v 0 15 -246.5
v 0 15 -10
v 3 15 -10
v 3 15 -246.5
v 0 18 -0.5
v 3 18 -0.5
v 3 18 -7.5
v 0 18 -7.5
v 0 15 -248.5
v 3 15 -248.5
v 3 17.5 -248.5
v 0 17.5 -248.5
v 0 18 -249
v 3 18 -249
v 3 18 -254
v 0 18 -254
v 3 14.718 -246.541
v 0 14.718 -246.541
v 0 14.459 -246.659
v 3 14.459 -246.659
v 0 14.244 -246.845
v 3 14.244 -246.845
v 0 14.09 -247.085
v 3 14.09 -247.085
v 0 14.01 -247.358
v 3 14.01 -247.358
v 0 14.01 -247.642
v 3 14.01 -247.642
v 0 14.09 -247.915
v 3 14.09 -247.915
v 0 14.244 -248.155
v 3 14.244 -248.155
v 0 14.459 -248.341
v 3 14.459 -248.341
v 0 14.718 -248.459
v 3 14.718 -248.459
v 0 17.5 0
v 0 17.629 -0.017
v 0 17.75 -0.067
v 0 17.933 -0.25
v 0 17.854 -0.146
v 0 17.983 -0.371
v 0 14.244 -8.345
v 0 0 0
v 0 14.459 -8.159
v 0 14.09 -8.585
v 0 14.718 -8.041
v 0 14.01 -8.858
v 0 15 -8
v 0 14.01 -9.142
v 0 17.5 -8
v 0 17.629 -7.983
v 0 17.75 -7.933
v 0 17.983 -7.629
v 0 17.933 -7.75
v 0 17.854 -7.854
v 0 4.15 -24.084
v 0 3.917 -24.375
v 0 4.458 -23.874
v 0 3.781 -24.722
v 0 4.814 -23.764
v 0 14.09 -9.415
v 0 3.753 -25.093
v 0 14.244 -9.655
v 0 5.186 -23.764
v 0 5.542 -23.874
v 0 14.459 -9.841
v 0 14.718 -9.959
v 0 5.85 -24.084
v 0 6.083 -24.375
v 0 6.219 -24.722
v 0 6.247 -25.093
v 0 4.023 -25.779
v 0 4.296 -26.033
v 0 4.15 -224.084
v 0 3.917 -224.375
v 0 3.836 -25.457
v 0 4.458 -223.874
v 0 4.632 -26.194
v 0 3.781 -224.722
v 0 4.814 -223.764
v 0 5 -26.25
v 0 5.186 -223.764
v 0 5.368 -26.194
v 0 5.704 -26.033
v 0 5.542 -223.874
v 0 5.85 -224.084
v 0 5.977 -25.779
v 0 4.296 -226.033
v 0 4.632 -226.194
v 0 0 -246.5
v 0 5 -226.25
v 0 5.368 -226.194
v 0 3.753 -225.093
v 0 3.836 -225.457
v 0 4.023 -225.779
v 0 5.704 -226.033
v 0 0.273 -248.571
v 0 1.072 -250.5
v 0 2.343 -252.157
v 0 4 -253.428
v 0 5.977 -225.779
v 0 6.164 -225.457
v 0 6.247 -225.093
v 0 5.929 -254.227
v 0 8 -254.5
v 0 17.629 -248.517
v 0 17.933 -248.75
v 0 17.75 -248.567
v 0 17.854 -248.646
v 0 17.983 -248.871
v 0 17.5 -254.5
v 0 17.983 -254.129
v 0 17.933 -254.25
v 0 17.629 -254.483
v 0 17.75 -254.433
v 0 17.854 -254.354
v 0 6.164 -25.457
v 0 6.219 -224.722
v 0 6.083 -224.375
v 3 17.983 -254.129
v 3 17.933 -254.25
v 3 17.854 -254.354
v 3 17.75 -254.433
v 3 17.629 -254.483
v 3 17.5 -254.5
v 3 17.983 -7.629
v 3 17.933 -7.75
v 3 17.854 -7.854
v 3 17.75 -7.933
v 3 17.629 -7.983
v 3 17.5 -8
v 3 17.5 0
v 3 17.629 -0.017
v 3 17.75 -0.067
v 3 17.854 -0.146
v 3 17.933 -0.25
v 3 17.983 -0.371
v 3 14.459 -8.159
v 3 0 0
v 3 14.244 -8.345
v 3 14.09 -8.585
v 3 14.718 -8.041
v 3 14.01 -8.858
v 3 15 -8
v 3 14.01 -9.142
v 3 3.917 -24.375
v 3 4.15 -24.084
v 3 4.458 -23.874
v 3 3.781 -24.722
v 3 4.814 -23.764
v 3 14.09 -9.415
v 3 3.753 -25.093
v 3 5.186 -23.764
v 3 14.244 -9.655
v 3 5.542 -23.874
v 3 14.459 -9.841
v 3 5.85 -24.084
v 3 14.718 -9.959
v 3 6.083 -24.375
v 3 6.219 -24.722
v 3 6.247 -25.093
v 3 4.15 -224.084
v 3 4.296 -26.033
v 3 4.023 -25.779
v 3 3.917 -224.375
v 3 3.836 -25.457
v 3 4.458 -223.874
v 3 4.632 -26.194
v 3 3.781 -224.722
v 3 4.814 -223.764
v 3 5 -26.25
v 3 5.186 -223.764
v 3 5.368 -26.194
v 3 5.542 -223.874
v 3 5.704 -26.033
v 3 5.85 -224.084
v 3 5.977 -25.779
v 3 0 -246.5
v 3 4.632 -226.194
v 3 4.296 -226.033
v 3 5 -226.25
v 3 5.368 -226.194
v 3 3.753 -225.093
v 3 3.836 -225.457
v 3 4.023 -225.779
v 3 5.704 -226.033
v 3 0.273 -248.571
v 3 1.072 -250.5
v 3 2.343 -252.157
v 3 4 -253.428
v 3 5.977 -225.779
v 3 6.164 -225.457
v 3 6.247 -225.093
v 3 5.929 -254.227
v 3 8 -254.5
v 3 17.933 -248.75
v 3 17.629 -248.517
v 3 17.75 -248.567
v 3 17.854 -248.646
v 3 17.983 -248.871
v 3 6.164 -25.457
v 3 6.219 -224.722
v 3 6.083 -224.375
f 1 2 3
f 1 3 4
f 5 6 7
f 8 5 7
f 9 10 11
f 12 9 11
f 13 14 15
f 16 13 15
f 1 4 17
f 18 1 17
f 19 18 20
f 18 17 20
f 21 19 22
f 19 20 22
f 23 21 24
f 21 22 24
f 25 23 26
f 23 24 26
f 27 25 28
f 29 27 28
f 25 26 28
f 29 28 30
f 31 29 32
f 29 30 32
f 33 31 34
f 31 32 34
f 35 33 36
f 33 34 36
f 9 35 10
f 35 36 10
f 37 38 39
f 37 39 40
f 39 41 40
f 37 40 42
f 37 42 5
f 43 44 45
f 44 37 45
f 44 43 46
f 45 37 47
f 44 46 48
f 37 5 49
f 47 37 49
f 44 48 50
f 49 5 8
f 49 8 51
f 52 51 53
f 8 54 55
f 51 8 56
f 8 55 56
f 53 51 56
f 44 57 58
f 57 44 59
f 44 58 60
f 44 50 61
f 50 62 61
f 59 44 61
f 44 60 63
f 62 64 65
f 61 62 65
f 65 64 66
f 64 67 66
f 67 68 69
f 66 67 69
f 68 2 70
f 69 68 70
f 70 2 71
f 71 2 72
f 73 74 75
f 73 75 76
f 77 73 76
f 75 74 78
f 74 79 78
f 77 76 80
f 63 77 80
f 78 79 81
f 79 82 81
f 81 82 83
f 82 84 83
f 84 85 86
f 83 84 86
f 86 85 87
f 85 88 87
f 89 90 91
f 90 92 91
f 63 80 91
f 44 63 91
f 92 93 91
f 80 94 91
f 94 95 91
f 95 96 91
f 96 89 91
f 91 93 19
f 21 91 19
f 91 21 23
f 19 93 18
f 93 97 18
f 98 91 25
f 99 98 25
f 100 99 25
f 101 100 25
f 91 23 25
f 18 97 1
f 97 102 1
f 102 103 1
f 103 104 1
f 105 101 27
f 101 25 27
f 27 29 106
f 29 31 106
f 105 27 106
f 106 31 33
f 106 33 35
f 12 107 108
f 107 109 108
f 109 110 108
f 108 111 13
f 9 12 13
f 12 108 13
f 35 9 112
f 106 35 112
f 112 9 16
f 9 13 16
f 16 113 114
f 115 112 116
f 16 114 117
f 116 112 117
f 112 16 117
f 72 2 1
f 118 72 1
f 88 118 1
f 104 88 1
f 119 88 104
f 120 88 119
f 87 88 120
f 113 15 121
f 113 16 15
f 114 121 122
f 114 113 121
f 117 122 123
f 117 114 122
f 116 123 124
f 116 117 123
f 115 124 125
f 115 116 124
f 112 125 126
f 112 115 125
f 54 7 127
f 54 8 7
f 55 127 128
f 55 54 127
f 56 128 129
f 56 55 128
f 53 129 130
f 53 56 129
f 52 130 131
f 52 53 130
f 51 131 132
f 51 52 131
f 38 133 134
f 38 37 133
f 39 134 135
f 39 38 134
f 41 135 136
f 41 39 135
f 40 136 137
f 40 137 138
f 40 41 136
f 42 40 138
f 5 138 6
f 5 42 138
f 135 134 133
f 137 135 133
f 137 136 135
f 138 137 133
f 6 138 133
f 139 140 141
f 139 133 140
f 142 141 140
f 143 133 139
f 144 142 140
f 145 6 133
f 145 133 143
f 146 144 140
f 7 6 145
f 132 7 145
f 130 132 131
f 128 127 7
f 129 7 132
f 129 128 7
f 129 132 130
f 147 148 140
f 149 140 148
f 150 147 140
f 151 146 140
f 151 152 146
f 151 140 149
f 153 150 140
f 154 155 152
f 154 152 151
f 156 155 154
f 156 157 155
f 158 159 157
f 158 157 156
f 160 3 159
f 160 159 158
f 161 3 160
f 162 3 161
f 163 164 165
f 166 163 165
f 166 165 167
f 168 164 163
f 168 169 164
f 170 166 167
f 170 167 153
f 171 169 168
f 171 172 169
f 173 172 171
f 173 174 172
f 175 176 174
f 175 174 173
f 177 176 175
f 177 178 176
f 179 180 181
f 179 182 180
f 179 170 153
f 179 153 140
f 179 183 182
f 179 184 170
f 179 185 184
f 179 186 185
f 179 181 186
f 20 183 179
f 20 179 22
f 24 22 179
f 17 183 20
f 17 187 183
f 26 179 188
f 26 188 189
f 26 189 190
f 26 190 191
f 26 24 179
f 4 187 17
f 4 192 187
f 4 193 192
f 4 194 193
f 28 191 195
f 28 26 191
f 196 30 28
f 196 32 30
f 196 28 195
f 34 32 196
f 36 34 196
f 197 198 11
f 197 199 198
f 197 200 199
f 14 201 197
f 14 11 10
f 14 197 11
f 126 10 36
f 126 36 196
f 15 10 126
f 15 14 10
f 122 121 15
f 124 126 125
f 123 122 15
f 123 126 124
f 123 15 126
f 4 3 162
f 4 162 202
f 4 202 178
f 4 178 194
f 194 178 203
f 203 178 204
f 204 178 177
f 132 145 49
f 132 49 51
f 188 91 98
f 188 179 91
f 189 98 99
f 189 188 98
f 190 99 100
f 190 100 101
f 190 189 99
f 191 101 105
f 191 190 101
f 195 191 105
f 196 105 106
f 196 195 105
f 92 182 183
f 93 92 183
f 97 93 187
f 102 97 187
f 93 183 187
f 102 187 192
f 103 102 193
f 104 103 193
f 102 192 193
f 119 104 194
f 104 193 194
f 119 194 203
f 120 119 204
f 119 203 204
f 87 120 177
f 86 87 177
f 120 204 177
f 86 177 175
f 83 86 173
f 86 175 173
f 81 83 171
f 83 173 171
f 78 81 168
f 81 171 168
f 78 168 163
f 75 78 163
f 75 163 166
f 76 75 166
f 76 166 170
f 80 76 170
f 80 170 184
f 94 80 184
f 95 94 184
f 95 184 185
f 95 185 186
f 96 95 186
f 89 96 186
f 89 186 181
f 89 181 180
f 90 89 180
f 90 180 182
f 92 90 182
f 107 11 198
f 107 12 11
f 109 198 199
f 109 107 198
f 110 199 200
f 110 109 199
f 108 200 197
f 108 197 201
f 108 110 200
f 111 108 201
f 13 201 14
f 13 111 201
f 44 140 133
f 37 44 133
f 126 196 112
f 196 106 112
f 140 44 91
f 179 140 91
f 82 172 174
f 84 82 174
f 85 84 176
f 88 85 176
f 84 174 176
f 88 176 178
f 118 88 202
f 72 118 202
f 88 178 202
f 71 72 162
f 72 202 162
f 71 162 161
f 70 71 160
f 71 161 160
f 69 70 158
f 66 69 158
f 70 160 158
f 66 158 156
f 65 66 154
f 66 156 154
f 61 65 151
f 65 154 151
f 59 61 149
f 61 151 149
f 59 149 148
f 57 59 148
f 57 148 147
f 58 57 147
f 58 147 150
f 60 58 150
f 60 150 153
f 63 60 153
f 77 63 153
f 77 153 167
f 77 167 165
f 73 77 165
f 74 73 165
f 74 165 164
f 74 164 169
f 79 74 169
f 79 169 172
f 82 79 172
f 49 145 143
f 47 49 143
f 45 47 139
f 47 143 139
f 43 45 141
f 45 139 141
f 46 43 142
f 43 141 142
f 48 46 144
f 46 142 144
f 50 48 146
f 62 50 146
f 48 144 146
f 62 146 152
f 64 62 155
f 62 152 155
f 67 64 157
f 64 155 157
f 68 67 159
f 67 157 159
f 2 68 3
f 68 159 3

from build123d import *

# Parameters (mm, degrees)
SKETCH_1_W          = 254.5
SKETCH_1_H          = 15
EXTRUDE_1_DEPTH     = 3
SKETCH_2_W          = 8
SKETCH_2_H          = 3
SKETCH_2_W_2        = 6
EXTRUDE_2_DEPTH     = 3
SKETCH_3_R          = 1
CUT_EXTRUDE_1_DEPTH = 3
FILLET_1_R          = 0.5
SKETCH_4_R          = 1.25
CUT_EXTRUDE_2_DEPTH = 10
FILLET_2_R          = 8


with BuildPart() as part:
    # 스케치1 → 보스-돌출1 (new body)
    with BuildSketch(Plane(origin=(0, 0, 0), x_dir=(0, 0, -1), z_dir=(1, 0, 0))):
        with Locations((127.25, 7.5)):
            Rectangle(SKETCH_1_W, SKETCH_1_H)
    extrude(amount=EXTRUDE_1_DEPTH)

    # 스케치2 → 보스-돌출2 (add)
    with BuildSketch(Plane(origin=(3, 0, 0), x_dir=(0, 0, -1), z_dir=(1, 0, 0))):
        with Locations((4, 16.5)):
            Rectangle(SKETCH_2_W, SKETCH_2_H)
        with Locations((251.5, 16.5)):
            Rectangle(SKETCH_2_W_2, SKETCH_2_H)
    extrude(amount=-EXTRUDE_2_DEPTH)

    # 스케치3 → 컷-돌출1 (cut)
    with BuildSketch(Plane(origin=(3, 0, 0), x_dir=(0, 0, -1), z_dir=(1, 0, 0))):
        with Locations((9, 15)):
            Circle(SKETCH_3_R)
        with Locations((247.5, 15)):
            Circle(SKETCH_3_R)
    extrude(amount=-CUT_EXTRUDE_1_DEPTH, mode=Mode.SUBTRACT)

    # 필렛1
    fillet_1_edges = [part.edges().sort_by_distance(p)[0] for p in [
        (1.5, 18, 0),
        (1.5, 18, -8),
        (1.5, 18, -254.5),
        (1.5, 18, -248.5),
    ]]
    fillet(fillet_1_edges, radius=FILLET_1_R)

    # 스케치4 → 컷-돌출2 (cut)
    with BuildSketch(Plane(origin=(3, 0, 0), x_dir=(0, 0, -1), z_dir=(1, 0, 0))):
        with Locations((225, 5)):
            Circle(SKETCH_4_R)
        with Locations((25, 5)):
            Circle(SKETCH_4_R)
    extrude(amount=-CUT_EXTRUDE_2_DEPTH, mode=Mode.SUBTRACT)

    # 필렛2
    fillet_2_edges = [part.edges().sort_by_distance(p)[0] for p in [
        (1.5, 0, -254.5),
    ]]
    fillet(fillet_2_edges, radius=FILLET_2_R)


solid = part.part
